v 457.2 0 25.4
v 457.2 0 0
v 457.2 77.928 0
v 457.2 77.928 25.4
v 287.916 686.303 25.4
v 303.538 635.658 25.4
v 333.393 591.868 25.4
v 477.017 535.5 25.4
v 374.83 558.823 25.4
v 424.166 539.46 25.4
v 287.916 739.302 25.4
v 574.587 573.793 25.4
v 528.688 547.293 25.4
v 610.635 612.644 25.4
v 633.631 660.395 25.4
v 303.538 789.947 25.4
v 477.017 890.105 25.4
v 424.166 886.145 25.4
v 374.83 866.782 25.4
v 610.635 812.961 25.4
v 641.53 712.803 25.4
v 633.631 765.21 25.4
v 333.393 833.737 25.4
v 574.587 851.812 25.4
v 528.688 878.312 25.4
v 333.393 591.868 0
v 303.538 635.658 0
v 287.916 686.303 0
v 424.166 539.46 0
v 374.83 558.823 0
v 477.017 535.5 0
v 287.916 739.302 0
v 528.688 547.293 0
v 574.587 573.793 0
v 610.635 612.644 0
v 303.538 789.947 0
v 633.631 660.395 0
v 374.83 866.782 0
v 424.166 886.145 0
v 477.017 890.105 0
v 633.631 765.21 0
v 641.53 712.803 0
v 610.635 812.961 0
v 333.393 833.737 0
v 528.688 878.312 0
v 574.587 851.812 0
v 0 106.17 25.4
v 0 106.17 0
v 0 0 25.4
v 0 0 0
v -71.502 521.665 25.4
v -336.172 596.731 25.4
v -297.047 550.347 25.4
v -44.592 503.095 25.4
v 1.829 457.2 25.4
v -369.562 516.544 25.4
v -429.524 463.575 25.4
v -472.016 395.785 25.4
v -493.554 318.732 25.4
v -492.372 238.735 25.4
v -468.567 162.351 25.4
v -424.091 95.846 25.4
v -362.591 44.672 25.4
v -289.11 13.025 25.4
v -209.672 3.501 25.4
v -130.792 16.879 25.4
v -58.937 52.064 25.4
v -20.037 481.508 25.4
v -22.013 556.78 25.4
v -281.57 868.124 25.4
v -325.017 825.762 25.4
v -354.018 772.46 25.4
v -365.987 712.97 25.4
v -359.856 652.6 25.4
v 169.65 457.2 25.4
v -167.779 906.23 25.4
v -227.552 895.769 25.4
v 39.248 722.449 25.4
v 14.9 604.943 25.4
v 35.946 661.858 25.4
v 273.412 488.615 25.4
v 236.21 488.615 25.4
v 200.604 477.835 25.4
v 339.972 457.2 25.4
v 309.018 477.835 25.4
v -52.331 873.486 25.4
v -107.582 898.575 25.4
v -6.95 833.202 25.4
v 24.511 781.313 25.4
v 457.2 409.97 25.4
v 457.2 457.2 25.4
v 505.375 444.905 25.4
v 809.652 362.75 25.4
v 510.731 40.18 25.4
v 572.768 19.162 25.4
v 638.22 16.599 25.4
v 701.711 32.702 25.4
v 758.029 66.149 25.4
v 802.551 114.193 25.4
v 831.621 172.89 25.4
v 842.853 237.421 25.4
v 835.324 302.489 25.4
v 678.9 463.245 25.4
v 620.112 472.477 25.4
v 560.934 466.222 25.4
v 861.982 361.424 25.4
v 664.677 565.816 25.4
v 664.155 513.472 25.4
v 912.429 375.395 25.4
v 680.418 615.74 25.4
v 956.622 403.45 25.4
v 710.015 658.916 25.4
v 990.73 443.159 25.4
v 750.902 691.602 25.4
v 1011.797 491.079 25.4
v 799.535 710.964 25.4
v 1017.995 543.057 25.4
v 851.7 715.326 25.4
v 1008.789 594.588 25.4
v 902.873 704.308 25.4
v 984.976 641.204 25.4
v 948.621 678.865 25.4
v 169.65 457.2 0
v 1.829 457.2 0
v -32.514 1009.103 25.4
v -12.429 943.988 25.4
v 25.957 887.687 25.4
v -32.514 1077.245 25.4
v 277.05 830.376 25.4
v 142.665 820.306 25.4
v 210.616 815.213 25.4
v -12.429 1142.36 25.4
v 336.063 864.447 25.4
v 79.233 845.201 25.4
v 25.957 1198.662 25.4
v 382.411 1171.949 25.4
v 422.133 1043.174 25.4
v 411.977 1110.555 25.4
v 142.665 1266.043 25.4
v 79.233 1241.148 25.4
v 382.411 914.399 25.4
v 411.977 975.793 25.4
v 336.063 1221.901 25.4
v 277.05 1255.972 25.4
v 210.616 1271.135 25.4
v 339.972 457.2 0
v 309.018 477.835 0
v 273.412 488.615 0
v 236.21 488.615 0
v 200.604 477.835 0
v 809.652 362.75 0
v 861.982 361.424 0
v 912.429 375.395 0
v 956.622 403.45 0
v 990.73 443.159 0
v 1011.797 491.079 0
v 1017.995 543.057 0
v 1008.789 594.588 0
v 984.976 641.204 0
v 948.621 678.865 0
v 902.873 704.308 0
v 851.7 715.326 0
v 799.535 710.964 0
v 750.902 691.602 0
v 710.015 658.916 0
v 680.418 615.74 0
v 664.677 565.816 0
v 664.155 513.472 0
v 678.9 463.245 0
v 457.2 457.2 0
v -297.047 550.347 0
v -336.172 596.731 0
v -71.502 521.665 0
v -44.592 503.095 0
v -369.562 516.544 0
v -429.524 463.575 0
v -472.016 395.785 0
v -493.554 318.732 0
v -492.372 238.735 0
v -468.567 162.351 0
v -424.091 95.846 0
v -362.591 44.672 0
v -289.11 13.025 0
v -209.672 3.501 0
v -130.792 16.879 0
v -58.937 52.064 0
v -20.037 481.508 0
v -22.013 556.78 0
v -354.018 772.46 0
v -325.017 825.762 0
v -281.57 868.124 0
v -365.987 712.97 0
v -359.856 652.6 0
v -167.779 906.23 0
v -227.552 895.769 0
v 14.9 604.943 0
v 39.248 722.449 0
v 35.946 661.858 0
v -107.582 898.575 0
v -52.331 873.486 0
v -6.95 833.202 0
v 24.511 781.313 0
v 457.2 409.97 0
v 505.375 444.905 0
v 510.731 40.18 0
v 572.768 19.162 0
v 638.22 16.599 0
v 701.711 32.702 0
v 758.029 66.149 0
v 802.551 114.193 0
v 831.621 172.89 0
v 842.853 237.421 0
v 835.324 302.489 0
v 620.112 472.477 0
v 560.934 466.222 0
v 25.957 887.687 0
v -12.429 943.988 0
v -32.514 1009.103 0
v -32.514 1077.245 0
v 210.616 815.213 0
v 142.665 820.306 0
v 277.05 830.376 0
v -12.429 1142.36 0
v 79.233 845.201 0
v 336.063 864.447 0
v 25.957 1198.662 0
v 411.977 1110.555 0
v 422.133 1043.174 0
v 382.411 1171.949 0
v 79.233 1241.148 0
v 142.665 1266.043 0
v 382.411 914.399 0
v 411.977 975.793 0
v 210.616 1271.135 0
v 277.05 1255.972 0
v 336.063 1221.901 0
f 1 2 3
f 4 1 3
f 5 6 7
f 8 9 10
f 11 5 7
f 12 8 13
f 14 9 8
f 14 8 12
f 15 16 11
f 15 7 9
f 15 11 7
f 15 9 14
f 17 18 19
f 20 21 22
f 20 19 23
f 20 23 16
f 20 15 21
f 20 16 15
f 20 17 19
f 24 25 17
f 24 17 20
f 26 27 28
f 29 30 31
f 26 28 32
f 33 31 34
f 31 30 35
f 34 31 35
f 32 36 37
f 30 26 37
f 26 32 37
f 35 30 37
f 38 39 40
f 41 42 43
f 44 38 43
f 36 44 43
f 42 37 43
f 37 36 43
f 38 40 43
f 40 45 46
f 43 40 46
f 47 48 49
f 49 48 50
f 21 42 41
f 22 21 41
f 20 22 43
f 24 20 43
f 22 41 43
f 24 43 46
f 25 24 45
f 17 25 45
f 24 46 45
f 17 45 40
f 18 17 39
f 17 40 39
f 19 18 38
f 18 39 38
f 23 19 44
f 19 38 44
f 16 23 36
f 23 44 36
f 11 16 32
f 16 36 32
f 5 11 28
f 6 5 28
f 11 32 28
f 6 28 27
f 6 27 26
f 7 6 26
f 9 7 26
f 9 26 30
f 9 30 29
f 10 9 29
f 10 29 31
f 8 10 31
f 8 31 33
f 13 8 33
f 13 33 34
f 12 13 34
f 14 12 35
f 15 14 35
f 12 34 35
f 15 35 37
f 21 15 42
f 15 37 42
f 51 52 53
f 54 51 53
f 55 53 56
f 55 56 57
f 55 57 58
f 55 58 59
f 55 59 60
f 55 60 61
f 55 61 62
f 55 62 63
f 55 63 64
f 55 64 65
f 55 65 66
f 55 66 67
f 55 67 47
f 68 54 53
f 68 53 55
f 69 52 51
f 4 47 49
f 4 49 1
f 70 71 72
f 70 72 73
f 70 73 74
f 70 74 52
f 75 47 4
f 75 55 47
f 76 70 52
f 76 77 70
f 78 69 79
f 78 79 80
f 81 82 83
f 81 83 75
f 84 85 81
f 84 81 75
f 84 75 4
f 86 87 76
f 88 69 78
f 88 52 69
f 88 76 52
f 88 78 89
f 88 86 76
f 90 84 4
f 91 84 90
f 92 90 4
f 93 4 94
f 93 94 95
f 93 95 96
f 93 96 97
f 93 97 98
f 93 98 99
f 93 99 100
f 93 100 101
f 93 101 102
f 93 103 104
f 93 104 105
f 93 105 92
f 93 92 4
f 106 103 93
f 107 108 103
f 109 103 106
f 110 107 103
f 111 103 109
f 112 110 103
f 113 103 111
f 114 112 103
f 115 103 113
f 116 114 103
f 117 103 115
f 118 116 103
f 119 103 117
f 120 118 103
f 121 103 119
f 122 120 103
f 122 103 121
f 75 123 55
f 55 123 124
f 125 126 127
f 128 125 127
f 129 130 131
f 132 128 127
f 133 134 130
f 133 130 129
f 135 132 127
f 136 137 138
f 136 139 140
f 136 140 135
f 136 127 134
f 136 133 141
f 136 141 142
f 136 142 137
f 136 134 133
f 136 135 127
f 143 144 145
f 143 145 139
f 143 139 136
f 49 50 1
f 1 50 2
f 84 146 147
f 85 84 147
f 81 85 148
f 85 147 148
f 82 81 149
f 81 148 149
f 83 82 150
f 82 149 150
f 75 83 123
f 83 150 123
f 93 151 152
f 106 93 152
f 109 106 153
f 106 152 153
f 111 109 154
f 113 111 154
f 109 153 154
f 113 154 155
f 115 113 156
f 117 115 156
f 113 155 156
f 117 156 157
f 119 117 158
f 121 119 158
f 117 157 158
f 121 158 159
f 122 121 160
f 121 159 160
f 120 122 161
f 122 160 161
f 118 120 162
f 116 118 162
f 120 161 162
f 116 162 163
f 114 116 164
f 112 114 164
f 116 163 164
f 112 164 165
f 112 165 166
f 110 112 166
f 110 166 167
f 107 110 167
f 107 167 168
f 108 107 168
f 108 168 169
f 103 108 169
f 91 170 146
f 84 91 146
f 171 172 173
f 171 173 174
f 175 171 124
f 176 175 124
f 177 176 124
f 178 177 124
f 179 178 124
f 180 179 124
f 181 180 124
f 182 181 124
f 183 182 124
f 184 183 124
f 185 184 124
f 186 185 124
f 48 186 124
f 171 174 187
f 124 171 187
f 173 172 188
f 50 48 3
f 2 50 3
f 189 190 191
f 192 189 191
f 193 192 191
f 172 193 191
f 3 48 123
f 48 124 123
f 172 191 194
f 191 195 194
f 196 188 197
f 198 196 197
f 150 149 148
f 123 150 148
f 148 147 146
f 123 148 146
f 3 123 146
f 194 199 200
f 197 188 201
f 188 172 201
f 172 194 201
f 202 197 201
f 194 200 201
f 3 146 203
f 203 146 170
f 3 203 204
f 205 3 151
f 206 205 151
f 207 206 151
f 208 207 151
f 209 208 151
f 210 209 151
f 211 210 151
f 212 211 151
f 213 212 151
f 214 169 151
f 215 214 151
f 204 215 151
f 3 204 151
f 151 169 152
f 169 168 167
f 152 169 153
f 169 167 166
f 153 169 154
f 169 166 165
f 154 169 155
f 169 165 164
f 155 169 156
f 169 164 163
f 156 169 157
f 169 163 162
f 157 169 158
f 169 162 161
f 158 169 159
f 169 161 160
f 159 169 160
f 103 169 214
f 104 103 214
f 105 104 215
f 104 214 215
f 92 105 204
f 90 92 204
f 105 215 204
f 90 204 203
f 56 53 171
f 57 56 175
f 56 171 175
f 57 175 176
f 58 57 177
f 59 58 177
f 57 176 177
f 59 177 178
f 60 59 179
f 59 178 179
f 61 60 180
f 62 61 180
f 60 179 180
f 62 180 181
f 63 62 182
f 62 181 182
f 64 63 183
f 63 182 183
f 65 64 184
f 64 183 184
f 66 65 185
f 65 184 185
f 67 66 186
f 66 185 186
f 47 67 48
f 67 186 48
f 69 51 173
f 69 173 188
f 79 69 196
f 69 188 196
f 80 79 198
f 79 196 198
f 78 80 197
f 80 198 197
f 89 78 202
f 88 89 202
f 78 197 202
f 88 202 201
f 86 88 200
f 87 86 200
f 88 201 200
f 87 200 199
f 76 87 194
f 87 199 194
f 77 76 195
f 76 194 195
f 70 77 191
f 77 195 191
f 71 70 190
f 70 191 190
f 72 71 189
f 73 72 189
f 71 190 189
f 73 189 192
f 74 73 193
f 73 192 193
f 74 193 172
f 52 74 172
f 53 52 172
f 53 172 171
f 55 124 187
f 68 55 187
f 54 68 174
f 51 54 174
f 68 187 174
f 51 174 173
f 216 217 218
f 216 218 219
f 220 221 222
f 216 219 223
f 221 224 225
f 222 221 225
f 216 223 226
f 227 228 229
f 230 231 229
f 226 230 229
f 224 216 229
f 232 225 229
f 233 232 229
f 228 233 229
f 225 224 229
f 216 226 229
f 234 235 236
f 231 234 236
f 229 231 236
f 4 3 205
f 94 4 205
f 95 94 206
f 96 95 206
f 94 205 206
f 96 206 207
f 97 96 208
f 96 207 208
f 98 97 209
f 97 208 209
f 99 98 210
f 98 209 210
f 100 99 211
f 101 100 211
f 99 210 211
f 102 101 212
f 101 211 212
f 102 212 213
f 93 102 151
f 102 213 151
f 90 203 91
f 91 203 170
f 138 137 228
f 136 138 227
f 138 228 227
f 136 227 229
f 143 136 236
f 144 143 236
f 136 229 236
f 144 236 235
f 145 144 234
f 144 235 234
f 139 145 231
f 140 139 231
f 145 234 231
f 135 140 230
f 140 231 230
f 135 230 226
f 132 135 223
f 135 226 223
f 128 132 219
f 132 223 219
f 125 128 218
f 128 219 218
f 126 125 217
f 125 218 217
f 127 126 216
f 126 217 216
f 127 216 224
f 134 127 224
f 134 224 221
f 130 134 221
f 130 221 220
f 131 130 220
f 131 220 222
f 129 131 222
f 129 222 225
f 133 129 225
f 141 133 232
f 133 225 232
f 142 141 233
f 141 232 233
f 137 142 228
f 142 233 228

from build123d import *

# Parameters (mm, degrees)
F1_DEPTH = 25.4
F0_R     = 177.8
F0_R_2   = 228.6


with BuildPart() as f1:
    # F0 (on Top) → F1 (new body)
    with BuildSketch(Plane.XY):
        with BuildLine():
            Line((0, 106.1704925997), (0, 0))
            Line((0, 0), (457.2, 0))
            Line((457.2, 0), (457.2, 77.9280348806))
            ThreePointArc((457.2, 77.9280348806), (385.7461465836, 243.9492642879), (457.2, 409.9704936953))
            Line((457.2, 409.9704936953), (457.2, 457.2))
            Line((457.2, 457.2), (339.9722308065, 457.2))
            ThreePointArc((339.9722308065, 457.2), (370.8808979376, 414.5282916672), (381.8108994961, 362.9845678806))
            ThreePointArc((381.8108994961, 362.9845678806), (203.2671757095, 246.9145694391), (169.6495681857, 457.2))
            Line((169.6495681857, 457.2), (1.8290267585, 457.2))
            ThreePointArc((1.8290267585, 457.2), (47.2113490763, 375.2059900347), (62.9281938314, 282.8179299831))
            ThreePointArc((62.9281938314, 282.8179299831), (46.7263916249, 189.0572309763), (0, 106.1704925997))
        make_face()
        with BuildLine():
            ThreePointArc((-297.047132431, 550.3473242517), (-448.7221619418, 127.4984777462), (0, 106.1704925997))
            Line((0, 106.1704925997), (0, 457.2))
            Line((0, 457.2), (1.8290267585, 457.2))
            ThreePointArc((1.8290267585, 457.2), (-31.9985650247, 492.6606884998), (-71.5017510394, 521.6652517514))
            ThreePointArc((-71.5017510394, 521.6652517514), (-188.6613987535, 501.508854323), (-297.047132431, 550.3473242517))
        make_face()
        with BuildLine():
            Line((0, 457.2), (0, 106.1704925997))
            ThreePointArc((0, 106.1704925997), (46.7263916249, 189.0572309763), (62.9281938314, 282.8179299831))
            ThreePointArc((62.9281938314, 282.8179299831), (47.2113490763, 375.2059900347), (1.8290267585, 457.2))
            Line((1.8290267585, 457.2), (0, 457.2))
        make_face()
        with BuildLine():
            ThreePointArc((457.2, 409.9704936953), (385.7461465836, 243.9492642879), (457.2, 77.9280348806))
            Line((457.2, 77.9280348806), (457.2, 409.9704936953))
        make_face()
        with BuildLine():
            Line((457.2, 409.9704936953), (457.2, 77.9280348806))
            ThreePointArc((457.2, 77.9280348806), (704.7185729397, 33.9712069712), (842.9461465836, 243.9492642879))
            ThreePointArc((842.9461465836, 243.9492642879), (834.4653000719, 305.6381471405), (809.6520235075, 362.7498301072))
            ThreePointArc((809.6520235075, 362.7498301072), (731.9200813722, 396.9218069347), (678.8997144688, 463.245403956))
            ThreePointArc((678.8997144688, 463.245403956), (560.933597278, 466.2217537613), (457.2, 409.9704936953))
        make_face()
        with BuildLine():
            ThreePointArc((-71.5017510394, 521.6652517514), (-181.2250247952, 559.9857932047), (-297.047132431, 550.3473242517))
            ThreePointArc((-297.047132431, 550.3473242517), (-188.6613987535, 501.508854323), (-71.5017510394, 521.6652517514))
        make_face()
        with BuildLine():
            ThreePointArc((40.1726240635, 703.0854821205), (-246.864794433, 888.1841781176), (-297.047132431, 550.3473242517))
            ThreePointArc((-297.047132431, 550.3473242517), (-181.2250247952, 559.9857932047), (-71.5017510394, 521.6652517514))
            ThreePointArc((-71.5017510394, 521.6652517514), (10.0163280505, 596.567331036), (40.1726240635, 703.0854821205))
        make_face()
        with BuildLine():
            ThreePointArc((809.6520235075, 362.7498301072), (753.6536225313, 425.1987805496), (678.8997144688, 463.245403956))
            ThreePointArc((678.8997144688, 463.245403956), (731.9200813722, 396.9218069347), (809.6520235075, 362.7498301072))
        make_face()
        with BuildLine():
            ThreePointArc((1018.0703404427, 537.893652916), (802.0529183564, 711.5377390493), (678.8997144688, 463.245403956))
            ThreePointArc((678.8997144688, 463.245403956), (753.6536225313, 425.1987805496), (809.6520235075, 362.7498301072))
            ThreePointArc((809.6520235075, 362.7498301072), (954.6576283048, 401.7746300884), (1018.0703404427, 537.893652916))
        make_face()
        with BuildLine():
            ThreePointArc((339.9722308065, 457.2), (254.8108994961, 489.9845678806), (169.6495681857, 457.2))
            Line((169.6495681857, 457.2), (339.9722308065, 457.2))
        make_face()
        with BuildLine():
            Line((339.9722308065, 457.2), (169.6495681857, 457.2))
            ThreePointArc((169.6495681857, 457.2), (203.2671757095, 246.9145694391), (381.8108994961, 362.9845678806))
            ThreePointArc((381.8108994961, 362.9845678806), (370.8808979376, 414.5282916672), (339.9722308065, 457.2))
        make_face()
    extrude(amount=F1_DEPTH)


with BuildPart() as f1b:
    # F0 (on Top) → F1, piece 2 (new body)
    with BuildSketch(Plane.XY):
        with Locations((463.7300372124, 712.8026485443)):
            Circle(F0_R)
    extrude(amount=F1_DEPTH)


with BuildPart() as f1c:
    # F0 (on Top) → F1, piece 3 (new body)
    with BuildSketch(Plane.XY):
        with Locations((193.5328543186, 1043.1741476059)):
            Circle(F0_R_2)
    extrude(amount=F1_DEPTH)


solid = Compound([f1.part, f1b.part, f1c.part])
